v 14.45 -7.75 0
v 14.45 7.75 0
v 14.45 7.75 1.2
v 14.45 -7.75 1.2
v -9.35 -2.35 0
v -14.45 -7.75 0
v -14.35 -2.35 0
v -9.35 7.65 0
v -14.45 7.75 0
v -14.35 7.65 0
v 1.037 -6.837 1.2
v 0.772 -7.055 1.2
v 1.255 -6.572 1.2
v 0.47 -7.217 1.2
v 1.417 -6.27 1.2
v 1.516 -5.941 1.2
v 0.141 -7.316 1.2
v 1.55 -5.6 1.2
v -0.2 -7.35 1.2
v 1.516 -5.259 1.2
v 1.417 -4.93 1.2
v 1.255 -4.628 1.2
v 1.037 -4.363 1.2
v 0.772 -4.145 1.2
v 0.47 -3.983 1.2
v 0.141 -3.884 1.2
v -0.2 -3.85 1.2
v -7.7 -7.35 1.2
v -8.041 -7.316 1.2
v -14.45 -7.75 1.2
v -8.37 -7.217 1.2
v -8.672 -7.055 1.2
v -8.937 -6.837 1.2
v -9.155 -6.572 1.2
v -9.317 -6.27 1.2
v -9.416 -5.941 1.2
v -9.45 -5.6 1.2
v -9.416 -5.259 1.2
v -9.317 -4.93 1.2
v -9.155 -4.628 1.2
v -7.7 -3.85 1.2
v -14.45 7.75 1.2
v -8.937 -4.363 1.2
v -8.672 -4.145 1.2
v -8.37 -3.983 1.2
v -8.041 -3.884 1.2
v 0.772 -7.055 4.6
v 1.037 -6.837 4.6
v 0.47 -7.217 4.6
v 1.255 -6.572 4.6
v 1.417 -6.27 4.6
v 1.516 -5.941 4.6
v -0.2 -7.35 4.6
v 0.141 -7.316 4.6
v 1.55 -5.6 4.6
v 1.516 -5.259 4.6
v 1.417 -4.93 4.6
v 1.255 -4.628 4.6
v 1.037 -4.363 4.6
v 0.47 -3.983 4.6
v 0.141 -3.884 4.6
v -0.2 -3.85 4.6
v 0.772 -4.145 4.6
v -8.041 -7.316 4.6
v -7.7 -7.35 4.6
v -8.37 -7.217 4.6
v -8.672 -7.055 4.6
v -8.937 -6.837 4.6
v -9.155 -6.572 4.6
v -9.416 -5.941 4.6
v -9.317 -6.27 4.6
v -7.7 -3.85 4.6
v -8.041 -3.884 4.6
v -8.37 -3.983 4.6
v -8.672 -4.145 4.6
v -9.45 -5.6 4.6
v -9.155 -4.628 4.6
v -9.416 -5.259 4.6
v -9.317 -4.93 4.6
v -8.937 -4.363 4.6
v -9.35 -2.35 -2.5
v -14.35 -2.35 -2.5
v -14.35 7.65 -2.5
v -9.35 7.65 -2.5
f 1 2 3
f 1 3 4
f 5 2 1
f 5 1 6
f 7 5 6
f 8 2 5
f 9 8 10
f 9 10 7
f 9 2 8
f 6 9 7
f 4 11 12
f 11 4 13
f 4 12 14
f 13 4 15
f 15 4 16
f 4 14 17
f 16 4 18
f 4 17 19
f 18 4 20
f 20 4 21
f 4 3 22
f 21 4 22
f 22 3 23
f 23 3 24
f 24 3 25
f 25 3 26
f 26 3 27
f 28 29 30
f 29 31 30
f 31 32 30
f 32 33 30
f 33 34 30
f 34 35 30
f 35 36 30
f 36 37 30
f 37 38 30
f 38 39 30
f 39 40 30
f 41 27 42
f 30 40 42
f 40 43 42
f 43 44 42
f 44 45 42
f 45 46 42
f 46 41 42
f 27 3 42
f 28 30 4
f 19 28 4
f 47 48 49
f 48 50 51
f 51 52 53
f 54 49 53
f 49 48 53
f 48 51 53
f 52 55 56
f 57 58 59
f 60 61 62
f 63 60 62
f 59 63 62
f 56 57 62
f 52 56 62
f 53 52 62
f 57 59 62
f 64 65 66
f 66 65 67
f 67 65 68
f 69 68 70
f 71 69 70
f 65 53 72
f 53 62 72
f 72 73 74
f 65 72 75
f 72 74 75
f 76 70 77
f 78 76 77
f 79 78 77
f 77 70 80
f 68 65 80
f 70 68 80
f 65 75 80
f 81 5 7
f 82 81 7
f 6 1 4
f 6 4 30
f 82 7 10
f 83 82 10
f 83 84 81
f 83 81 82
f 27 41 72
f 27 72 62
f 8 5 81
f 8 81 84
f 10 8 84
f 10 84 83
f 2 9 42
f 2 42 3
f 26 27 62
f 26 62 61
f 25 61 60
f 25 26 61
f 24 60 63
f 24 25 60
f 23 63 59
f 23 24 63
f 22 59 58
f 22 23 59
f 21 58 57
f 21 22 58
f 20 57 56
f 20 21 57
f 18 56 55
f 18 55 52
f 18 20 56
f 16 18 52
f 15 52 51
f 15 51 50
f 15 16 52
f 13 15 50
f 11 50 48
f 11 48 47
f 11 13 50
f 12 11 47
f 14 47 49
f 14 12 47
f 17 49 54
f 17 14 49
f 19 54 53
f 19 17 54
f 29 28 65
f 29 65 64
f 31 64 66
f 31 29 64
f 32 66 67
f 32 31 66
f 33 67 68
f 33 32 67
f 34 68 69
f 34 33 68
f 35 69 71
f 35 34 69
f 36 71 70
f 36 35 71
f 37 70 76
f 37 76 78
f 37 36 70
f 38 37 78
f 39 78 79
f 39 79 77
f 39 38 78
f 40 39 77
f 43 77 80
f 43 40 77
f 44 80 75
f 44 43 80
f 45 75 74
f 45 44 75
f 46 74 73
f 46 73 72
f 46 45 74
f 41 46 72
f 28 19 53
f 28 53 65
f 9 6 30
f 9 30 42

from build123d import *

# Parameters (mm, degrees)
BOSS_EXTRUDE1_DEPTH = 1.2
BOSS_EXTRUDE2_DEPTH = 3.4
SKETCH3_W           = 5
SKETCH3_H           = 10
BOSS_EXTRUDE3_DEPTH = 2.5


with BuildPart() as part:
    # Sketch1 → Boss-Extrude1 (new body)
    with BuildSketch(Plane.XY):
        Polygon((-14.45, 7.75), (14.45, 7.75), (-14.45, -7.75), align=None)
        Polygon((14.45, 7.75), (14.45, -7.75), (-14.45, -7.75), align=None)
    extrude(amount=BOSS_EXTRUDE1_DEPTH)

    # Sketch2 → Boss-Extrude2 (add)
    with BuildSketch(Plane.XY.offset(1.2)):
        with BuildLine():
            Line((-7.7, -3.85), (-0.2, -3.85))
            ThreePointArc((-0.2, -3.85), (1.55, -5.6), (-0.2, -7.35))
            Line((-0.2, -7.35), (-7.7, -7.35))
            ThreePointArc((-7.7, -7.35), (-9.45, -5.6), (-7.7, -3.85))
        make_face()
    extrude(amount=BOSS_EXTRUDE2_DEPTH)

    # Sketch3 → Boss-Extrude3 (add)
    with BuildSketch(Plane(origin=(0, 0, 0), x_dir=(-1, 0, 0), z_dir=(0, 0, -1))):
        with Locations((11.85, 2.65)):
            Rectangle(SKETCH3_W, SKETCH3_H)
    extrude(amount=BOSS_EXTRUDE3_DEPTH)


solid = part.part
